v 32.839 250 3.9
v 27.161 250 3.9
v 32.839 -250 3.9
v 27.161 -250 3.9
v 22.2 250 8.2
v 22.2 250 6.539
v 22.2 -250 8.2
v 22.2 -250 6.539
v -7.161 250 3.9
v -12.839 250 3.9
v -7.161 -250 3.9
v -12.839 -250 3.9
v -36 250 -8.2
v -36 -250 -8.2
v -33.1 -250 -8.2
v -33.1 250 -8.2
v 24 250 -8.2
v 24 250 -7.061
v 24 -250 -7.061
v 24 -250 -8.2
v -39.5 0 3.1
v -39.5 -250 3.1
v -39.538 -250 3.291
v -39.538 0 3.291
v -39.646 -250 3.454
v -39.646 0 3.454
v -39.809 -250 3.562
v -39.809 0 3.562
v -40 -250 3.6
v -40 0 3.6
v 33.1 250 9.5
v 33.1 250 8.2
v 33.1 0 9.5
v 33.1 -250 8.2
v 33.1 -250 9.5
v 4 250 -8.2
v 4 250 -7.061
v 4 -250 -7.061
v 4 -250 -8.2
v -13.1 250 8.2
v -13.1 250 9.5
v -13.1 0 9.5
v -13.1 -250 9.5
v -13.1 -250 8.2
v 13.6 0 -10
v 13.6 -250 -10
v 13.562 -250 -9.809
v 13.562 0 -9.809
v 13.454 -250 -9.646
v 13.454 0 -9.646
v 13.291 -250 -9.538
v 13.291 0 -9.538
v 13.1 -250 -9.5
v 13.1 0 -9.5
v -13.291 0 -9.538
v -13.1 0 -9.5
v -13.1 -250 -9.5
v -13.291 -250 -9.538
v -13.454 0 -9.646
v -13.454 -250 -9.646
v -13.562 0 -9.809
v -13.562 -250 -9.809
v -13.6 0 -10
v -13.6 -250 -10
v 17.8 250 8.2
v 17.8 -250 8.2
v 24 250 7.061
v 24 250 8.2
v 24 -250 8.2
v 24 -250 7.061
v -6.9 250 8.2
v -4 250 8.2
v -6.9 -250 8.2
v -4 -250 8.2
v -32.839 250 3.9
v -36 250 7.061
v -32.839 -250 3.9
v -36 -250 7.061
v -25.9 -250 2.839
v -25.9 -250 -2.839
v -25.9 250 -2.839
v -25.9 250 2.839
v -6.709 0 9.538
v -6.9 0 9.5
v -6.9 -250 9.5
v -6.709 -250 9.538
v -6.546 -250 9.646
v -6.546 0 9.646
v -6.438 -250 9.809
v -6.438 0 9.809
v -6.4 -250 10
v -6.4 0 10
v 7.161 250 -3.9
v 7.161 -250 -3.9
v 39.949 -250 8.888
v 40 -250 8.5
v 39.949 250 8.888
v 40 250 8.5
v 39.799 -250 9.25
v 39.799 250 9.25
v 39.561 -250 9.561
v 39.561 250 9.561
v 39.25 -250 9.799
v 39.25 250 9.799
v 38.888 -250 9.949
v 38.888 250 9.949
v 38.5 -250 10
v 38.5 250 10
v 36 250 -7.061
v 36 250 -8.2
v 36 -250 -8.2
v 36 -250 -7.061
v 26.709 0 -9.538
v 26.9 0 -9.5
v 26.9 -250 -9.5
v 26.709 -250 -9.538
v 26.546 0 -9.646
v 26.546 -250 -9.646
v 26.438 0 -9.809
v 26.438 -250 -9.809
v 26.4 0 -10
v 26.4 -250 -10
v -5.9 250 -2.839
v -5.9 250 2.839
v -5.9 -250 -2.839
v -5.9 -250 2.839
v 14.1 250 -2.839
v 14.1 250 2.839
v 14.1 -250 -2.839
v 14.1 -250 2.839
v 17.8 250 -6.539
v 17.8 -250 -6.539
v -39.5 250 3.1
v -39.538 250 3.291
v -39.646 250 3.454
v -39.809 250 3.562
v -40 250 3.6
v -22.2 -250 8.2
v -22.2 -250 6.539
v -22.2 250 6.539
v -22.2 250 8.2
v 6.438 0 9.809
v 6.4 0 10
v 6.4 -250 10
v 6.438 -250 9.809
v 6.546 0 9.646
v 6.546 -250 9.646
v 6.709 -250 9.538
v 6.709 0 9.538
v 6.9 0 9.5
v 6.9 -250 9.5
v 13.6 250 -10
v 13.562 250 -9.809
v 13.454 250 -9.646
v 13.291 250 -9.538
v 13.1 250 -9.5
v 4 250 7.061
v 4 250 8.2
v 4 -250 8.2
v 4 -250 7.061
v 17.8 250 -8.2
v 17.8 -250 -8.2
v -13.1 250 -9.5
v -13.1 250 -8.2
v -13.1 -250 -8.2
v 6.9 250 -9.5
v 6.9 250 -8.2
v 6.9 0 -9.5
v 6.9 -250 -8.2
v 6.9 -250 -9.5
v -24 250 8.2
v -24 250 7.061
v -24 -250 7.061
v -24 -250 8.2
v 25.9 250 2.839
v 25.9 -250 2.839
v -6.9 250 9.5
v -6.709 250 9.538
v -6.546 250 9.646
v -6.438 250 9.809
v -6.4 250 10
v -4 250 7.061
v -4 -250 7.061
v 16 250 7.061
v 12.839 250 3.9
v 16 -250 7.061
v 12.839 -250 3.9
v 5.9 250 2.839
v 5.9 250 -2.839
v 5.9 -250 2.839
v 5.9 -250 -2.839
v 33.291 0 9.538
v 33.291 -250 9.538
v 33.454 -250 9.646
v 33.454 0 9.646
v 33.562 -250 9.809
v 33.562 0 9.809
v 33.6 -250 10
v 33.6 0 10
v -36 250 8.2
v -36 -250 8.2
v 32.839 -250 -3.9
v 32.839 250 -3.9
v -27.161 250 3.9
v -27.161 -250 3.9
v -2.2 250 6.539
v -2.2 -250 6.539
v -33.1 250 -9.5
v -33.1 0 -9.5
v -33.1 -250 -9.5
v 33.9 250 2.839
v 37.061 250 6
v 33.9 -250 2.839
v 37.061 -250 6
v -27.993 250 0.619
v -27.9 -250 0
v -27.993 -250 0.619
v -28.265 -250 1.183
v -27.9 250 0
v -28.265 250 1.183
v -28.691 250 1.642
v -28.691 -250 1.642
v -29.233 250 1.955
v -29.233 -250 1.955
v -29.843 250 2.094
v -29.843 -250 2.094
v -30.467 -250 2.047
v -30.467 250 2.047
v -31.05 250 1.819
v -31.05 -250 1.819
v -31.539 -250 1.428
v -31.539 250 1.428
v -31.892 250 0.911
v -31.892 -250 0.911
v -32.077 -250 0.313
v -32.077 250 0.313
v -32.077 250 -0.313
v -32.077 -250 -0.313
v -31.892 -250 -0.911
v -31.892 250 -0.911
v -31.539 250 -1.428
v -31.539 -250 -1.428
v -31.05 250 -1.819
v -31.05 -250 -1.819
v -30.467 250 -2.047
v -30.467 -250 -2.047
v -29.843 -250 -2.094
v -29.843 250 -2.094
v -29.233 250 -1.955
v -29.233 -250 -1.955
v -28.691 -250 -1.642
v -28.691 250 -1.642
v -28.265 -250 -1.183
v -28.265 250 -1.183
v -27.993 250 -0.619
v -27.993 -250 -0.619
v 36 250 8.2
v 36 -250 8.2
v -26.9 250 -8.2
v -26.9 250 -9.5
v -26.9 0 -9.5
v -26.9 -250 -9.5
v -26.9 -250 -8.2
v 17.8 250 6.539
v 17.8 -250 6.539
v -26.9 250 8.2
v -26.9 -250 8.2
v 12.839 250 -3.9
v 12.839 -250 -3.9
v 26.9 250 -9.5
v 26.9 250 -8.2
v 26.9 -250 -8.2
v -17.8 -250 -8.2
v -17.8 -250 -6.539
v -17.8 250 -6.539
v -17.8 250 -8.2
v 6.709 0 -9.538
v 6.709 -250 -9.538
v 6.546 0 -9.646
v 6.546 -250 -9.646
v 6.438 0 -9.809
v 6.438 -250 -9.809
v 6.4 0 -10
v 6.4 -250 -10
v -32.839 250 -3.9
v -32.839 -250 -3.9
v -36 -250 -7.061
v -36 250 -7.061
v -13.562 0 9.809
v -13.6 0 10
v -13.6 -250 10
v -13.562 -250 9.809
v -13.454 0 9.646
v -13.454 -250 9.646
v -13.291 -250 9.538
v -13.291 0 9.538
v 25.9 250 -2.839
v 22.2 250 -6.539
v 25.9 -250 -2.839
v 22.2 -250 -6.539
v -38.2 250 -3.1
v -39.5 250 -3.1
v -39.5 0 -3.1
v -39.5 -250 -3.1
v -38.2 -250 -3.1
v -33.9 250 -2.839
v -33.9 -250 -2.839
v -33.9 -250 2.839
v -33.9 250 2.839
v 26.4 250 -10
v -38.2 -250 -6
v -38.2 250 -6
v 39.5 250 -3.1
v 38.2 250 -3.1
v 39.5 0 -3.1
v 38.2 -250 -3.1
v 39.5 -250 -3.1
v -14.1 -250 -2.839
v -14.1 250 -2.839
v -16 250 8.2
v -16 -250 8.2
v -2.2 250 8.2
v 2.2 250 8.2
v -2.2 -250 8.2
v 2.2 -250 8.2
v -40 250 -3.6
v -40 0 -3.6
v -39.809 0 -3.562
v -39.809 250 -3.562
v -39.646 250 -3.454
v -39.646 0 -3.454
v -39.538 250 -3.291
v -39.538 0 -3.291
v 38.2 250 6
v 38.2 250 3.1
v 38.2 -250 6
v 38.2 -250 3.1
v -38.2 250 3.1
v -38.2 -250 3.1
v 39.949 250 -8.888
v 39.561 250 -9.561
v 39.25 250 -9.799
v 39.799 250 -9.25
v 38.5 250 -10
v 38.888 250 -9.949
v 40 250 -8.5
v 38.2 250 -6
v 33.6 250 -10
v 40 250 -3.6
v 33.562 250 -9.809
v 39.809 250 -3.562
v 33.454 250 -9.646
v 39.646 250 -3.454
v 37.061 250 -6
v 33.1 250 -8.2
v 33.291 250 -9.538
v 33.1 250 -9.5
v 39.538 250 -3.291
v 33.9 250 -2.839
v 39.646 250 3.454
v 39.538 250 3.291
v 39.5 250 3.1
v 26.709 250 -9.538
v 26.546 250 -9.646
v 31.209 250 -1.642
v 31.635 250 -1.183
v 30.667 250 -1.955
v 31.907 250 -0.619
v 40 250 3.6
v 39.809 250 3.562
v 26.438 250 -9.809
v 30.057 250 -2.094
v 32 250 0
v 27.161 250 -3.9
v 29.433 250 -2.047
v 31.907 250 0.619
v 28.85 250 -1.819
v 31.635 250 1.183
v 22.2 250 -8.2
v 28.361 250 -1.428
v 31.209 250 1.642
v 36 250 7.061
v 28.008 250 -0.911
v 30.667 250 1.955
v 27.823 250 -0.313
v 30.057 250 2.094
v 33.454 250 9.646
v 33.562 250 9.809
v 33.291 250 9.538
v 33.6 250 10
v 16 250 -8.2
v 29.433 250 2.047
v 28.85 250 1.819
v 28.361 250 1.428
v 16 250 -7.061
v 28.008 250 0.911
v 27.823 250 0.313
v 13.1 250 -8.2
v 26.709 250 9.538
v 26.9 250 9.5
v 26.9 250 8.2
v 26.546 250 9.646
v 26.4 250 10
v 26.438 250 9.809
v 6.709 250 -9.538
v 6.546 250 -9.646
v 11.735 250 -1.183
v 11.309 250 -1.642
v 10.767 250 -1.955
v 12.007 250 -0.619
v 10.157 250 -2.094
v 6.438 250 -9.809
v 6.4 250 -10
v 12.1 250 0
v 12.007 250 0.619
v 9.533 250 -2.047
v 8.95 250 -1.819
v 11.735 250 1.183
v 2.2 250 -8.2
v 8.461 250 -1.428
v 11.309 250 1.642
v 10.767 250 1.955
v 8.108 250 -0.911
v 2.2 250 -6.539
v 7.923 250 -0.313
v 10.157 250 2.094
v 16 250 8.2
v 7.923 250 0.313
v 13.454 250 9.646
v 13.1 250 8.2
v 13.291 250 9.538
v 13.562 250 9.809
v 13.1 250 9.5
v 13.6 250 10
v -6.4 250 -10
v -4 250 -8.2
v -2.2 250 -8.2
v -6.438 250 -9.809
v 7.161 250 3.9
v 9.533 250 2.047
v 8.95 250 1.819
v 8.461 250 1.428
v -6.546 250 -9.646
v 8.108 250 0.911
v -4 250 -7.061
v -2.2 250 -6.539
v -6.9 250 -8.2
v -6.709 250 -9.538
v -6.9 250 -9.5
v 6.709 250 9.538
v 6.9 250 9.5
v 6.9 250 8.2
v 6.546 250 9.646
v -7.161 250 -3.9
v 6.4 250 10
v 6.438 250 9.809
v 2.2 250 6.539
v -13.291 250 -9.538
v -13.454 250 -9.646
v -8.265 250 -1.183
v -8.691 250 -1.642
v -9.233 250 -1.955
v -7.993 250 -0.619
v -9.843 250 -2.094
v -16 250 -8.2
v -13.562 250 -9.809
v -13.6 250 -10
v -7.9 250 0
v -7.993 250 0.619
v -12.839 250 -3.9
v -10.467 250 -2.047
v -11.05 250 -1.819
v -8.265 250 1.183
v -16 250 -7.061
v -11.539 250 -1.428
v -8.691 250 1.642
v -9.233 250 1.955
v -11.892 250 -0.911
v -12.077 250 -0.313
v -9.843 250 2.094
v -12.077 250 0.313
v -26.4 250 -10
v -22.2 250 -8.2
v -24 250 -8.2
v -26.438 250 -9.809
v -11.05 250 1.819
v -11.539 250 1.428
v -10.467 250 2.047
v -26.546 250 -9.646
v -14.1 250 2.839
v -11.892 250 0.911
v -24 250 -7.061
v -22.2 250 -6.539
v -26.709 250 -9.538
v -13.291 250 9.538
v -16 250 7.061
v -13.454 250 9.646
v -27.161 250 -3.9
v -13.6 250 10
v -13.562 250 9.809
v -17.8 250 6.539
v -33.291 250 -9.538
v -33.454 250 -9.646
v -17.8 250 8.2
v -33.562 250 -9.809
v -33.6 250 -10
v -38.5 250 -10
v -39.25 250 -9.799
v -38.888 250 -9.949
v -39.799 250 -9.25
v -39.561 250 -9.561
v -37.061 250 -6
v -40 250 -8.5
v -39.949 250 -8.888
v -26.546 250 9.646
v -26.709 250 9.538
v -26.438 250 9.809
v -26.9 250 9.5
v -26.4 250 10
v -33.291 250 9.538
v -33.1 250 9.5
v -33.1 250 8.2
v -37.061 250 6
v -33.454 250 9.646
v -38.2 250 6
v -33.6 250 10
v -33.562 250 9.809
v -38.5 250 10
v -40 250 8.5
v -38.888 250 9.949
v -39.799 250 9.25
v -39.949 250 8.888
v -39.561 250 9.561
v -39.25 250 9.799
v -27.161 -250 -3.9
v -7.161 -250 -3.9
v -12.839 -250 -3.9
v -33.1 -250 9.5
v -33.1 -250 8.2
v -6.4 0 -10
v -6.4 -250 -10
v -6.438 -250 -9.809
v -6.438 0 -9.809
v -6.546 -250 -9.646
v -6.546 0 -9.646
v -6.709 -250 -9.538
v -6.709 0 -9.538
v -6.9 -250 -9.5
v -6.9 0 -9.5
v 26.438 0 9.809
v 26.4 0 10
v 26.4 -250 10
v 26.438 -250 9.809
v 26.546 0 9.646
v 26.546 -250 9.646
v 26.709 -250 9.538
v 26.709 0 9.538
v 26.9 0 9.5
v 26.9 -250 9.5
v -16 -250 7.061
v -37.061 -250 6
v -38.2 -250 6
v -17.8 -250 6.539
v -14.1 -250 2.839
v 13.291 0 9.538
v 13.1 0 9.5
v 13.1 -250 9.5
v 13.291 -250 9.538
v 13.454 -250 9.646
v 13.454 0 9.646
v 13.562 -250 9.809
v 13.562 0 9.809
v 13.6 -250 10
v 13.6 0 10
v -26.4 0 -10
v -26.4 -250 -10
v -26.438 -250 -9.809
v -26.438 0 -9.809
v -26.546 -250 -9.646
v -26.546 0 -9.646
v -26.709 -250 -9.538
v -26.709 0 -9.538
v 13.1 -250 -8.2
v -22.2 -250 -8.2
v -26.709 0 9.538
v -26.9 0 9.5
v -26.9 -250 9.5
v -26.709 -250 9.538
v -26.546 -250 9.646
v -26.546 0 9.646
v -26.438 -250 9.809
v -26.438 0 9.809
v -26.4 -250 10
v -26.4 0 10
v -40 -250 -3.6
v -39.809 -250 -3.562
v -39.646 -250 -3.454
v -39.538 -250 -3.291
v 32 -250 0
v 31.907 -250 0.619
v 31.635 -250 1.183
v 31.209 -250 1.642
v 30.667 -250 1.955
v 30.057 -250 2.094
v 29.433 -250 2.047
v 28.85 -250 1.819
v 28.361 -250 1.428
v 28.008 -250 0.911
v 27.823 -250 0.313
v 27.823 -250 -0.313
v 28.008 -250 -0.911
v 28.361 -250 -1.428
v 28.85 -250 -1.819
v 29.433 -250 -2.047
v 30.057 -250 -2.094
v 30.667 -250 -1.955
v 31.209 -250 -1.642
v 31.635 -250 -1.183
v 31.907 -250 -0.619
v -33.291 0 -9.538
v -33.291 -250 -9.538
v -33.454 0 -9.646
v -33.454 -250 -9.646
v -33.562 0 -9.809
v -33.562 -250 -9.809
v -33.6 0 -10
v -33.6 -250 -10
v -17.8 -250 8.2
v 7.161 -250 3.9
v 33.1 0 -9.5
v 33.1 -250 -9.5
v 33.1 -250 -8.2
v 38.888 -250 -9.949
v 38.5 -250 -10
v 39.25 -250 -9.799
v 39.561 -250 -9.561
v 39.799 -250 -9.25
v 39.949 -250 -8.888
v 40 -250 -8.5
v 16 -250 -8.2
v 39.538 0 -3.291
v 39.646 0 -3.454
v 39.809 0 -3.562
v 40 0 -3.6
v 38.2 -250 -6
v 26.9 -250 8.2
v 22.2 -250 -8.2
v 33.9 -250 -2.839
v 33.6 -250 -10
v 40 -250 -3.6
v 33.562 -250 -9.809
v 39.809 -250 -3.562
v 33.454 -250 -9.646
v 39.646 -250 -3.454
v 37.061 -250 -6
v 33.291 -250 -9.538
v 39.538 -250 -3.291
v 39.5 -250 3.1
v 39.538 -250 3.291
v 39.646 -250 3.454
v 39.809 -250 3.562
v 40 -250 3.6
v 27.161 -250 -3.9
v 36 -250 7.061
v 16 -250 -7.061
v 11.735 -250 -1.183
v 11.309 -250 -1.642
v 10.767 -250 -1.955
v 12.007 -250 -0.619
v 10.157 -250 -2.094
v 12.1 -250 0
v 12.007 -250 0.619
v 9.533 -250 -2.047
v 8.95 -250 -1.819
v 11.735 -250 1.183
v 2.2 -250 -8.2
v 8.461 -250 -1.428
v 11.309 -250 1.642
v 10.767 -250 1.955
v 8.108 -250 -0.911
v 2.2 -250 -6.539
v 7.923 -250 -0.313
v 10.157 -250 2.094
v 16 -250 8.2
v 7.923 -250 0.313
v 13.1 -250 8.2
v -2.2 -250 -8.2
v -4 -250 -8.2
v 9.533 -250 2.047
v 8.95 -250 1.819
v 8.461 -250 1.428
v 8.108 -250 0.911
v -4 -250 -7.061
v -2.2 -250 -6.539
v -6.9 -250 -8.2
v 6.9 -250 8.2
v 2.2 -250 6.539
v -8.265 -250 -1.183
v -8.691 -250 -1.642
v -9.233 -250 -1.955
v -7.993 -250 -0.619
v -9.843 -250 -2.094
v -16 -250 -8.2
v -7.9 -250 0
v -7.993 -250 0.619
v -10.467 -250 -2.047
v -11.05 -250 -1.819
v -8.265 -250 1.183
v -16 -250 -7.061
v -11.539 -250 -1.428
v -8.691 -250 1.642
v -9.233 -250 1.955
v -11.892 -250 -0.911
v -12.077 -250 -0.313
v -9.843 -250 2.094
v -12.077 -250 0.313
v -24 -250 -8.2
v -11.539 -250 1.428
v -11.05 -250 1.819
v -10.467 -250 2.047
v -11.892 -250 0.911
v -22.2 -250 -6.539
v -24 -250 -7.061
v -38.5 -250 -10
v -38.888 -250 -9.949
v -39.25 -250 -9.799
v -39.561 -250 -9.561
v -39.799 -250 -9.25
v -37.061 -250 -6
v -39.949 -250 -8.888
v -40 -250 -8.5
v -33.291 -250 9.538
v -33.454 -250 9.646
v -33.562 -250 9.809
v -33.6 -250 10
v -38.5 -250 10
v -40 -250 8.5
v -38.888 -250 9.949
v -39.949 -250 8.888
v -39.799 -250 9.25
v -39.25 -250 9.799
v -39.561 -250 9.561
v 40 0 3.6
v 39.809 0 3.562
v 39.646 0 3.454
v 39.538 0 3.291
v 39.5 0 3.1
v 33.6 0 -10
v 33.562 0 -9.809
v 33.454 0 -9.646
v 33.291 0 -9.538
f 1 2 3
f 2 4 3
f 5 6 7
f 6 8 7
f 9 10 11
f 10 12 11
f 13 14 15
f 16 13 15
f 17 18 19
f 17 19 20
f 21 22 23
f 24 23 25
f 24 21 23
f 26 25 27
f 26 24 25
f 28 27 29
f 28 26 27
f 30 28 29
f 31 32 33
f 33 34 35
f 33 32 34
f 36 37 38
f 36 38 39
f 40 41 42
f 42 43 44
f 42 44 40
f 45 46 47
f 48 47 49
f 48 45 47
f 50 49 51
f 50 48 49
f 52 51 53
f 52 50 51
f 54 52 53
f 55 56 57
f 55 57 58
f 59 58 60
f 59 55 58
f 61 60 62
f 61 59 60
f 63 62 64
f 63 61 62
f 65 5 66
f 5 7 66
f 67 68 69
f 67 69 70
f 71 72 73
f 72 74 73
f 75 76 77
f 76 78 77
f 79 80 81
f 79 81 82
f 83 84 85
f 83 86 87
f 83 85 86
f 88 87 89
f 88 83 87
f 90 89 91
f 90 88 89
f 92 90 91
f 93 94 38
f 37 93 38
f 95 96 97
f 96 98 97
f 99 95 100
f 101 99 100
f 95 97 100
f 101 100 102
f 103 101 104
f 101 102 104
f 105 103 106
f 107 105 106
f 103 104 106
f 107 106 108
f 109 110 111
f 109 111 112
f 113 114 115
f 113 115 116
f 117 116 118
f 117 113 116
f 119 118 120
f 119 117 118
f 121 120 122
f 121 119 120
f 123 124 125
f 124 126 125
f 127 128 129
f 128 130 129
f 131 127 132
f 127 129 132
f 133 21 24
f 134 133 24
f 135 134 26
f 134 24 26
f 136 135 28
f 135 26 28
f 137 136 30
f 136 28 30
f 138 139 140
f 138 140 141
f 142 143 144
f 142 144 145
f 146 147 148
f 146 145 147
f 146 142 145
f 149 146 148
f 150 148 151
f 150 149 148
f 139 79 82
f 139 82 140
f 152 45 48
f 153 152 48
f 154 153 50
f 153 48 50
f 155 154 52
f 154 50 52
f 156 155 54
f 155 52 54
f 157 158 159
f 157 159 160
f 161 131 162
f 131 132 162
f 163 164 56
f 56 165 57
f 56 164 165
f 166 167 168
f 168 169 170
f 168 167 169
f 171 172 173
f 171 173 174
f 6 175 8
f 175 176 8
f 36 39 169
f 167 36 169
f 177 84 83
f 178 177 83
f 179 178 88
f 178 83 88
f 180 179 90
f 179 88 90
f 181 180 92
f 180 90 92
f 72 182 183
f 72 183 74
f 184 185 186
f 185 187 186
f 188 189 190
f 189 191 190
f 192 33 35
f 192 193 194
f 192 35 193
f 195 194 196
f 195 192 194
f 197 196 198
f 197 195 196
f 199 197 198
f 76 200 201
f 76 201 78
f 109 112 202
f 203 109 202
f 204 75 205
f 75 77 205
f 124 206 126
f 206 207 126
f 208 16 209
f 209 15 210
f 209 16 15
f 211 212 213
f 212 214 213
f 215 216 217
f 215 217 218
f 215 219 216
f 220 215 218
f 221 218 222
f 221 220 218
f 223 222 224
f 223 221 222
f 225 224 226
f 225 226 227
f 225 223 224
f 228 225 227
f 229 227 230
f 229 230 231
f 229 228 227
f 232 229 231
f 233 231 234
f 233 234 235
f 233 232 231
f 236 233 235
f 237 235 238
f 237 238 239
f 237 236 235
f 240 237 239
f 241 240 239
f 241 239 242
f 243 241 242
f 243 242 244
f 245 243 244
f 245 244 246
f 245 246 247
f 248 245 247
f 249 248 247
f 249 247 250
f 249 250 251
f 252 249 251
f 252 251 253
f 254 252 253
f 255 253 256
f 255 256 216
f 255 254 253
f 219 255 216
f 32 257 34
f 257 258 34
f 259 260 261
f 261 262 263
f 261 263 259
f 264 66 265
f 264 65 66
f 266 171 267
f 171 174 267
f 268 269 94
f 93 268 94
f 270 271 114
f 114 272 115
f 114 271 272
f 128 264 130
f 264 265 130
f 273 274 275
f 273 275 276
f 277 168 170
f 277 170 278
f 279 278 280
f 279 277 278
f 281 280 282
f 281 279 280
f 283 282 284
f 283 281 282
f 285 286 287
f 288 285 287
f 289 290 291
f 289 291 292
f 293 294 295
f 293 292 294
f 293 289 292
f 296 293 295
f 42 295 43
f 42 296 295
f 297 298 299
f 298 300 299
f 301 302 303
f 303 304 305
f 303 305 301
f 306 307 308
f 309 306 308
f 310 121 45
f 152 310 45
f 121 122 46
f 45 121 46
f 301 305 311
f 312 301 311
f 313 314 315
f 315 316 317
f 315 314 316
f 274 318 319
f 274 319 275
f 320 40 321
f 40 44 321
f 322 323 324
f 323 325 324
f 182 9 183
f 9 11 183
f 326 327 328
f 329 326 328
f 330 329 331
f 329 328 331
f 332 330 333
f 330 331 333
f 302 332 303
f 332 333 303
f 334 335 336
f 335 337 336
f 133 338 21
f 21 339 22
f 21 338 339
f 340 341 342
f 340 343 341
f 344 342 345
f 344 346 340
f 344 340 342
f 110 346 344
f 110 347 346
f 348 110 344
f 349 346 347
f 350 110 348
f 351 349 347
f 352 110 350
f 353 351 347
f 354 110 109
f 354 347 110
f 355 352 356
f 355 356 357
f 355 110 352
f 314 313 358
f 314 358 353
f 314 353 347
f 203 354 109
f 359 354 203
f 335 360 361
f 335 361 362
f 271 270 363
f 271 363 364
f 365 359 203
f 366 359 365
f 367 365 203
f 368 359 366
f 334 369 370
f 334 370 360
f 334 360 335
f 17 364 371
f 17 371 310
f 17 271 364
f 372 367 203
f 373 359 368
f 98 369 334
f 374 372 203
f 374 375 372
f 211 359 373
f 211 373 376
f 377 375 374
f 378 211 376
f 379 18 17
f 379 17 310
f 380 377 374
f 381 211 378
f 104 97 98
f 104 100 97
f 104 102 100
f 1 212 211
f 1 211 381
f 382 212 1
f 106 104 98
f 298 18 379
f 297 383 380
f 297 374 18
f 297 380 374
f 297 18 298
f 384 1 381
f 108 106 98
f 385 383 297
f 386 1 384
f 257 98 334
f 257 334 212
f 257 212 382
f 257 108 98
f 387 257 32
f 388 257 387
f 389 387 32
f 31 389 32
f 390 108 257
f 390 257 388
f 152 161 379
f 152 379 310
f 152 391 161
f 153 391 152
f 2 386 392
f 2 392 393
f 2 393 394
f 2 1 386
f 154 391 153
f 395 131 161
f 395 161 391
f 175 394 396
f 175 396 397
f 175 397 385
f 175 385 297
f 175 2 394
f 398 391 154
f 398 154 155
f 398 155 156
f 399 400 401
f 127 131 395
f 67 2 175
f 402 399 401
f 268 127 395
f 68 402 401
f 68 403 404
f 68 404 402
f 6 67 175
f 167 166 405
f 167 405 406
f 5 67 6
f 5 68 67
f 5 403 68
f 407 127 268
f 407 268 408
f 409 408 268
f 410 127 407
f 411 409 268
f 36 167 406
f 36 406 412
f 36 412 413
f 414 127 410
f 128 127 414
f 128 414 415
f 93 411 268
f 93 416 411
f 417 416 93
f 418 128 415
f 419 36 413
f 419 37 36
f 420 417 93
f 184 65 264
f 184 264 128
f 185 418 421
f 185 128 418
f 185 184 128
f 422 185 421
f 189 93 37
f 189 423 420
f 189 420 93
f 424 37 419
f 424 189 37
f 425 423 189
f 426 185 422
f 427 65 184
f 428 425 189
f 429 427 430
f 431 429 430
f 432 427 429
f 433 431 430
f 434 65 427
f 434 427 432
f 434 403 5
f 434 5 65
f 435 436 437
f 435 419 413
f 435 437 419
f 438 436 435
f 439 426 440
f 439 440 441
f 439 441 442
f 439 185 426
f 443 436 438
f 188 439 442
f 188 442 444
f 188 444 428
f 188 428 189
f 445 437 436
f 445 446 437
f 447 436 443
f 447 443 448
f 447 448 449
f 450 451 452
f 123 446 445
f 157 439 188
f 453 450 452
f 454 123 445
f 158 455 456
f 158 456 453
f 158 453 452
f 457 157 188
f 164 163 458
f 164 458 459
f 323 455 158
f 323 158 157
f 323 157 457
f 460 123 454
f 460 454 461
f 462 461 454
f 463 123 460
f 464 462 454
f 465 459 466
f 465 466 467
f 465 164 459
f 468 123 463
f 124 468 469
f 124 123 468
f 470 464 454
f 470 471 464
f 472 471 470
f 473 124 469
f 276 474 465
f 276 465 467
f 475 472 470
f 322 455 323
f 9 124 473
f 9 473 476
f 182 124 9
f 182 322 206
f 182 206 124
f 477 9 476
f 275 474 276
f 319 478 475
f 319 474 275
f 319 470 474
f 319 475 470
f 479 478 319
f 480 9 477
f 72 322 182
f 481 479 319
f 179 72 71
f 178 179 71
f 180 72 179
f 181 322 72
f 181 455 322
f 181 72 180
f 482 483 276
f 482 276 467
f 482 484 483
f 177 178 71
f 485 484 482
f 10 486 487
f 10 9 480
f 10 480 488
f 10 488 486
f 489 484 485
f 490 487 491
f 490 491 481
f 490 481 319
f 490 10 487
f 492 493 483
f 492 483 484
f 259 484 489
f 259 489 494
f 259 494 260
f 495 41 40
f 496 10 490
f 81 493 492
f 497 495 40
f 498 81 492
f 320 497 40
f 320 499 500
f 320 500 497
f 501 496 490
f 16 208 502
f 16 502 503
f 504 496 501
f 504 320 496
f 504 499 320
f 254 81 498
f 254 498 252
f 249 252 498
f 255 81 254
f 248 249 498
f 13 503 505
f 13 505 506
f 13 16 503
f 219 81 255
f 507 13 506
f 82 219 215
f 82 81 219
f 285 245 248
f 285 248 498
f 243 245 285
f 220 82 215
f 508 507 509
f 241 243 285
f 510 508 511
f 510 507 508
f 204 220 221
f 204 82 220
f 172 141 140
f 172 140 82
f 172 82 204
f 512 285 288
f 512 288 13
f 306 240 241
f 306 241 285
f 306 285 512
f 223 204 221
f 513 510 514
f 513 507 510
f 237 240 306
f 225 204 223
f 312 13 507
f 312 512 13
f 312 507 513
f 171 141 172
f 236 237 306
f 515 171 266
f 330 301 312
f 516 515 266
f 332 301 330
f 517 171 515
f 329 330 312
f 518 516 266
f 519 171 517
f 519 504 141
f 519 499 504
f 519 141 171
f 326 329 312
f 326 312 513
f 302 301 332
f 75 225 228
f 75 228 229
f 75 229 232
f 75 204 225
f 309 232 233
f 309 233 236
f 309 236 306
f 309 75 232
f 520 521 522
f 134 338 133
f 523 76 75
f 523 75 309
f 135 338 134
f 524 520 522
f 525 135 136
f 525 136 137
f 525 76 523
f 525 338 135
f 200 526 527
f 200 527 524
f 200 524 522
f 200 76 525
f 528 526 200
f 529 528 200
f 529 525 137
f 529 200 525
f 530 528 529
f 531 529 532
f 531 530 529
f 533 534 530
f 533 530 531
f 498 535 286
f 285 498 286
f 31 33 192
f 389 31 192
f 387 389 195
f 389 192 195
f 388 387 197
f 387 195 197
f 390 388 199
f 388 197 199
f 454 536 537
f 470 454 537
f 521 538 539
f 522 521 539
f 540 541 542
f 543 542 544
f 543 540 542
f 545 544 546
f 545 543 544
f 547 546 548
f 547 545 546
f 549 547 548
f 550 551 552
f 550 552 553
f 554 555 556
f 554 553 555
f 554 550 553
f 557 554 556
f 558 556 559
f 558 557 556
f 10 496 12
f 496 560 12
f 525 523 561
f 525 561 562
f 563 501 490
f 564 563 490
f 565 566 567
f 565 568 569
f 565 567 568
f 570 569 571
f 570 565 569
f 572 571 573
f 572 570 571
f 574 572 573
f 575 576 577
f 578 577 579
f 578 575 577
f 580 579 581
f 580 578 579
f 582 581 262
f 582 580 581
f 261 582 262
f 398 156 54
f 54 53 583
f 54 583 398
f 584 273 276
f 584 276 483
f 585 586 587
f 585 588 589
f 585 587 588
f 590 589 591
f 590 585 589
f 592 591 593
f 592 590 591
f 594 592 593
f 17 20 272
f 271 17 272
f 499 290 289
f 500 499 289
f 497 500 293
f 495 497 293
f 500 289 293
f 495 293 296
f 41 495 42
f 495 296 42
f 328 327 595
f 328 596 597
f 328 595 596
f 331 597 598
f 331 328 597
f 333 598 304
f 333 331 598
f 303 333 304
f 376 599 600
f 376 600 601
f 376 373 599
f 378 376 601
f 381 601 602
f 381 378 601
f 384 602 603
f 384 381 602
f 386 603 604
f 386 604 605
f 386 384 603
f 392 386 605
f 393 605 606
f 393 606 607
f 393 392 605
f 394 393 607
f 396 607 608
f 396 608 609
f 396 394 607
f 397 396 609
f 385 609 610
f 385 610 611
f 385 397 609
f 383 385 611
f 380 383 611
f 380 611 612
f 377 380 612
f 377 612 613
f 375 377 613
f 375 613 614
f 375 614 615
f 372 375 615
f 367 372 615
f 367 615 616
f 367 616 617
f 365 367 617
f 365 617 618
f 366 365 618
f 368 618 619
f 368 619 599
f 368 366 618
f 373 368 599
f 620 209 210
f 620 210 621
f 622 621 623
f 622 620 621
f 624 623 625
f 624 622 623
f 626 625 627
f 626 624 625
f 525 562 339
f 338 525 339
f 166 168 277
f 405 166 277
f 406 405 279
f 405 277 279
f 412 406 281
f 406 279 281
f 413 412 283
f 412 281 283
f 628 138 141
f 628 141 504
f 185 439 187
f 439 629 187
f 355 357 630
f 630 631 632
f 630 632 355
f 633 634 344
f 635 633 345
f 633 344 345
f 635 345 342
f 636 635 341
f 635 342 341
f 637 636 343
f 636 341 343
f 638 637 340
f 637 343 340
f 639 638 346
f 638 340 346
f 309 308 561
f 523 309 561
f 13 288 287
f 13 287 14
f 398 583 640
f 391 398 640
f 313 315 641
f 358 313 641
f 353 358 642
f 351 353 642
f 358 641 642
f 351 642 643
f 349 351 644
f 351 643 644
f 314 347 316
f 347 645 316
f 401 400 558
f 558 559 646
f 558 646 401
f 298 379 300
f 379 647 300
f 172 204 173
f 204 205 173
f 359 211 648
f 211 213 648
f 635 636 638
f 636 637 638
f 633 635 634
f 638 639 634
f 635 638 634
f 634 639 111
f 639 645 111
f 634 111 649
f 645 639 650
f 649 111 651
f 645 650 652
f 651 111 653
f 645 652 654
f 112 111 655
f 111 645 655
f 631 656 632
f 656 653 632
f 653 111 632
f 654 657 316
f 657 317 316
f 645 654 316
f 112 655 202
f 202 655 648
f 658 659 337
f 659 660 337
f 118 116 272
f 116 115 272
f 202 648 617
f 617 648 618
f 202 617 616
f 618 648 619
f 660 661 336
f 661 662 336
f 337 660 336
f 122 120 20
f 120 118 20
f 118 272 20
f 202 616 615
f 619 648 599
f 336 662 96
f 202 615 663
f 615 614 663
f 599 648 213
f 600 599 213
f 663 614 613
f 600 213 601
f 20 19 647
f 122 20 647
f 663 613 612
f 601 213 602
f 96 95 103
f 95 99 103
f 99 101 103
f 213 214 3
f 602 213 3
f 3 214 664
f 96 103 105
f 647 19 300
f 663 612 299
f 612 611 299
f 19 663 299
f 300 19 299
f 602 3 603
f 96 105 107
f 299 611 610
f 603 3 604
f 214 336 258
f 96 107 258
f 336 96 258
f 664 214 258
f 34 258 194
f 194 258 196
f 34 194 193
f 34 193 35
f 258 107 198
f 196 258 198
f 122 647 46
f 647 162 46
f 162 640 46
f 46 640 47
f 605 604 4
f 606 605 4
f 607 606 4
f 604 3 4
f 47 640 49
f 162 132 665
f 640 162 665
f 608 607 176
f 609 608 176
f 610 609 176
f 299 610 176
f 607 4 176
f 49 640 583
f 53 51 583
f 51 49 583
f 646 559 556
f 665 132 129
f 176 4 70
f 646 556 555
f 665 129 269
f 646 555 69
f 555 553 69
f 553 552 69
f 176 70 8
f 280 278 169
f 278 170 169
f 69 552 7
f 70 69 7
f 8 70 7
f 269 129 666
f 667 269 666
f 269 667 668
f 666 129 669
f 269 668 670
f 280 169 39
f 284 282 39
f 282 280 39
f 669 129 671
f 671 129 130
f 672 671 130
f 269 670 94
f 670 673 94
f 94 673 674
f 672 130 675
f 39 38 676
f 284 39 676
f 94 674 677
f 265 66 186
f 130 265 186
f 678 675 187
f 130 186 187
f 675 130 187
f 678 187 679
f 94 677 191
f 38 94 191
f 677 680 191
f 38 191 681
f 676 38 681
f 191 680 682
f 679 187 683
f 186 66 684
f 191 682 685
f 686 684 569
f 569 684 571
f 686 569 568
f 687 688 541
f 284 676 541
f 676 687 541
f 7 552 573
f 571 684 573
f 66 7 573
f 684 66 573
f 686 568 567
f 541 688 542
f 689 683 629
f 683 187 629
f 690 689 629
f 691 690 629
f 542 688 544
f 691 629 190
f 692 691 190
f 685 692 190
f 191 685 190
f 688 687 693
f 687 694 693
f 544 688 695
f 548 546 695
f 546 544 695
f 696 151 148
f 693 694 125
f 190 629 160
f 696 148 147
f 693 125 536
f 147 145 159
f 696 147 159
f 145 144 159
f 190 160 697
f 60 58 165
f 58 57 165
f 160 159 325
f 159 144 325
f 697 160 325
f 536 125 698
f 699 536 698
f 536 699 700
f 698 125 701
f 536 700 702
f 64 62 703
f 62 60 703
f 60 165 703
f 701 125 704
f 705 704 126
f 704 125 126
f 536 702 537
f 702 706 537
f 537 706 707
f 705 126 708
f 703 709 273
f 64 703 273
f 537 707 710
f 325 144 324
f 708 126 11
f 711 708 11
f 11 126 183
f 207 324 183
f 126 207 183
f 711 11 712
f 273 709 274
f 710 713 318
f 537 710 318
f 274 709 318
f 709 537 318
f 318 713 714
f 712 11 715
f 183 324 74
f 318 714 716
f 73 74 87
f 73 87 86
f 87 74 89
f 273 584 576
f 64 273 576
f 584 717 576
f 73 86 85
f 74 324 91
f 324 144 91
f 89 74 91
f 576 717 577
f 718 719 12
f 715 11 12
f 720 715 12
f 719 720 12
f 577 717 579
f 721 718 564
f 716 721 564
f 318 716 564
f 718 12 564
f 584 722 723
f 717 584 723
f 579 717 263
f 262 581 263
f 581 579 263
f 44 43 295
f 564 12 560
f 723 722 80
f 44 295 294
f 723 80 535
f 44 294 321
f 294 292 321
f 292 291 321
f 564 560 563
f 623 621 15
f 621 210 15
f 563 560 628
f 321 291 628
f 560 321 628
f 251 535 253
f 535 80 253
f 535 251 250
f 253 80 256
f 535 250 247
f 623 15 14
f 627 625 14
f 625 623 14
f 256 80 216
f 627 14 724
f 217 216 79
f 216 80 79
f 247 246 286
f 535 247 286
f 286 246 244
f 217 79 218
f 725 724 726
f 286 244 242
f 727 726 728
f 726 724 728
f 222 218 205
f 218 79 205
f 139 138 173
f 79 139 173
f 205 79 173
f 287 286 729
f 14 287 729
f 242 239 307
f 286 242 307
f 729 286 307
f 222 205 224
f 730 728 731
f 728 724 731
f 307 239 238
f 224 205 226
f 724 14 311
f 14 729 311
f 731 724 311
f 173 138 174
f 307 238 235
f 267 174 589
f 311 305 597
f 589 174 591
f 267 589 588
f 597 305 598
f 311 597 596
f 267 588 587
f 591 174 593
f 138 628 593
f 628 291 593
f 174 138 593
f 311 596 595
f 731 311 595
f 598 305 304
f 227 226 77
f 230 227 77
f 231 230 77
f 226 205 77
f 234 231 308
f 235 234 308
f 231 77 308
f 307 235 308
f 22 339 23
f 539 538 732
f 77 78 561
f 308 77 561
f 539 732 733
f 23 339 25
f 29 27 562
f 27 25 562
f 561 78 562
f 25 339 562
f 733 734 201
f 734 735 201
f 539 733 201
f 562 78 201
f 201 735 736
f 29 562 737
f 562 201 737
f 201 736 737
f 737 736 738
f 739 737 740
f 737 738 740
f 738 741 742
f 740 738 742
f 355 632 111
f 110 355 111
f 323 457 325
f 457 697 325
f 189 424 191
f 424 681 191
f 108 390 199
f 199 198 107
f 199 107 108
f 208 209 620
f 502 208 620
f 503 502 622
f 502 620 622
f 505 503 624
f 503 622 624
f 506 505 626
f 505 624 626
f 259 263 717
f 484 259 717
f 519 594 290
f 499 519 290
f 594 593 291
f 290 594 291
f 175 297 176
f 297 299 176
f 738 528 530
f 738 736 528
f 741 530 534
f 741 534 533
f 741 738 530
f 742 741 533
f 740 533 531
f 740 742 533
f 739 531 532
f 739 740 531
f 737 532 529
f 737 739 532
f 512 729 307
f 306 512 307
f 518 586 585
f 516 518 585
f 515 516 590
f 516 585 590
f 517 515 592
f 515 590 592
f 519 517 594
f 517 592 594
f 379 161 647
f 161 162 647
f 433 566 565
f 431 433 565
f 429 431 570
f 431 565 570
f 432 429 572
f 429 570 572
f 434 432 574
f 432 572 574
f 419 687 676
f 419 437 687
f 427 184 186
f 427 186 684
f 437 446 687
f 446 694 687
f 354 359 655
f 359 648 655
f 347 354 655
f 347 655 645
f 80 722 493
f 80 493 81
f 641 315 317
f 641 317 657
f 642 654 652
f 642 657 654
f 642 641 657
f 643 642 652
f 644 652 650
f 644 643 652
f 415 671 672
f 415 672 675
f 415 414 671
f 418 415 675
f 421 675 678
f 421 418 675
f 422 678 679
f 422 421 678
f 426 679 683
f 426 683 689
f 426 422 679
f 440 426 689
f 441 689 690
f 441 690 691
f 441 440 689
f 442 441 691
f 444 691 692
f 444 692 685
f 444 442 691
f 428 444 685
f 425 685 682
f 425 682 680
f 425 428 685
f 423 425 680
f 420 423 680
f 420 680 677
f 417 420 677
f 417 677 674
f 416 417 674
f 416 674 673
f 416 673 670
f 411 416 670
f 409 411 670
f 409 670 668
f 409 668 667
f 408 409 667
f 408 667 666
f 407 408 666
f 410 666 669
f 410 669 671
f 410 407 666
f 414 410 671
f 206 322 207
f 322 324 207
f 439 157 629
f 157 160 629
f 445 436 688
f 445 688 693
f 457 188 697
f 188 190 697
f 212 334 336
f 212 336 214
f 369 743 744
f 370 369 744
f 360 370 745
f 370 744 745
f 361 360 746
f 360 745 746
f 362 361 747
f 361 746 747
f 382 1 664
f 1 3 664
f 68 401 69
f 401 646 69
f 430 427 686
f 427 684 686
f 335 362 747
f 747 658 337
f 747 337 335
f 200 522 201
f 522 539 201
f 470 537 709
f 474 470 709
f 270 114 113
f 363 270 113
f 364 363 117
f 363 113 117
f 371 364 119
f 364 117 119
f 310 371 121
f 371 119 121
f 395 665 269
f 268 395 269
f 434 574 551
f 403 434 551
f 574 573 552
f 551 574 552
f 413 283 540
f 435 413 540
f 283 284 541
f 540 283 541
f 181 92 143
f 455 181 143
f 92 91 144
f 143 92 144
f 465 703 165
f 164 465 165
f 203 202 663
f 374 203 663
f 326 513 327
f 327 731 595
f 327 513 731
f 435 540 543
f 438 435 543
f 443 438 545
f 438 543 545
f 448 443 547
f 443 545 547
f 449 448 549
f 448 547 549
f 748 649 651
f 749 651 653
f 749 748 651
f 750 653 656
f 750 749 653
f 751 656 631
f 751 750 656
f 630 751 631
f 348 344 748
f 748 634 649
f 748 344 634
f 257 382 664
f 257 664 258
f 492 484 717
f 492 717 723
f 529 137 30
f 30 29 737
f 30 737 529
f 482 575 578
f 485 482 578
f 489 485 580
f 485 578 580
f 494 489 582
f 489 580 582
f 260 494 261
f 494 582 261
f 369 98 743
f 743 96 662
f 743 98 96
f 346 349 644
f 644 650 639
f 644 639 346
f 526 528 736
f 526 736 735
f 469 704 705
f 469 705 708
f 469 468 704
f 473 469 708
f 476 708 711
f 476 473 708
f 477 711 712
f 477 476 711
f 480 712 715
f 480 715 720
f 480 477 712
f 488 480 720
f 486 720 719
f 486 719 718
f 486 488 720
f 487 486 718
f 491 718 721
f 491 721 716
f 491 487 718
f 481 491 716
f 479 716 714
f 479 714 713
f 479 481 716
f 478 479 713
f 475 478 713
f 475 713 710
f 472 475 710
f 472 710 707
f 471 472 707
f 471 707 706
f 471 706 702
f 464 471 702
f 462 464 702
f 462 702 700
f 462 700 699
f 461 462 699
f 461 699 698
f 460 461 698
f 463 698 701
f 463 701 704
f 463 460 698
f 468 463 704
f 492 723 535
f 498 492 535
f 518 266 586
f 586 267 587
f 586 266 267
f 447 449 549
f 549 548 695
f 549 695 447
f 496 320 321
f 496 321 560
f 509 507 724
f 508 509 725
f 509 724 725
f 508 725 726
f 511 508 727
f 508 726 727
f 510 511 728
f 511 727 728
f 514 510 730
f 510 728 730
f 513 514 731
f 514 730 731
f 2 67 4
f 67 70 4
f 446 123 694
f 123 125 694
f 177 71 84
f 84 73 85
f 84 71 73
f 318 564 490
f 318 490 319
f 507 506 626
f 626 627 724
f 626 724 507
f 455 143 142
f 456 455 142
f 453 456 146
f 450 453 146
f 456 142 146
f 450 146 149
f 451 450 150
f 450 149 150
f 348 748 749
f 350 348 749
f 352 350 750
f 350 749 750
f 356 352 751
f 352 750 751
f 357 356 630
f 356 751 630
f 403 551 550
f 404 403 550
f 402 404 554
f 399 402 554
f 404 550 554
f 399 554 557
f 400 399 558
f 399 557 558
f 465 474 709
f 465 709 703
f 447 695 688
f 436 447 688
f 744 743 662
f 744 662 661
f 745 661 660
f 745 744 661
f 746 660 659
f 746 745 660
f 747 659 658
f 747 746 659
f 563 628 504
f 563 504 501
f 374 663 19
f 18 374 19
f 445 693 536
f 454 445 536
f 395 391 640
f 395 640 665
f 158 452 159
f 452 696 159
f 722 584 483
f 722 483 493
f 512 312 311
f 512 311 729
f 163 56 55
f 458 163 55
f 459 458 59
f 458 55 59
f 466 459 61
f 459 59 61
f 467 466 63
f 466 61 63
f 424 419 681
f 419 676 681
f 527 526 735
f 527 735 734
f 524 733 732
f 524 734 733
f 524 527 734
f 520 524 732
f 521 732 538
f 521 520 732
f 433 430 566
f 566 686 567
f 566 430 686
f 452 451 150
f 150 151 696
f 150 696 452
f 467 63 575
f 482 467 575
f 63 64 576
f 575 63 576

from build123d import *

# Parameters (mm, degrees)
SKETCH_R          = 2.1
PAD_DEPTH         = 250
FILLET_R          = 1.5
SKETCH001_R       = 0.5
POCKET_DEPTH      = 250.001
POCKET_DEPTH_BACK = -250.001


with BuildPart() as part:
    # Sketch → Pad (new body, symmetric)
    with BuildSketch(Plane.XZ):
        Polygon((-10, 10), (-3.1, 10), (-3.1, 8.2), (-6, 8.2), (-6, 7.06066), (-2.83934, 3.9), (2.83934, 3.9), (6, 7.06066), (6, 8.2), (3.1, 8.2), (3.1, 10), (16.9, 10), (16.9, 8.2), (14, 8.2), (14, 7.06066), (17.16066, 3.9), (22.83934, 3.9), (26, 7.06066), (26, 8.2), (23.1, 8.2), (23.1, 10), (36.9, 10), (36.9, 8.2), (34, 8.2), (34, 7.06066), (37.16066, 3.9), (42.83934, 3.9), (46, 7.06066), (46, 8.2), (43.1, 8.2), (43.1, 10), (56.9, 10), (56.9, 8.2), (54, 8.2), (54, 7.06066), (57.16066, 3.9), (62.83934, 3.9), (66, 7.06066), (66, 8.2), (63.1, 8.2), (63.1, 10), (70, 10), (70, 3.1), (68.2, 3.1), (68.2, 6), (67.06066, 6), (63.9, 2.83934), (63.9, -2.83934), (67.06066, -6), (68.2, -6), (68.2, -3.1), (70, -3.1), (70, -10), (63.1, -10), (63.1, -8.2), (66, -8.2), (66, -7.06066), (62.83934, -3.9), (57.16066, -3.9), (54, -7.06066), (54, -8.2), (56.9, -8.2), (56.9, -10), (43.1, -10), (43.1, -8.2), (46, -8.2), (46, -7.06066), (42.83934, -3.9), (37.16066, -3.9), (34, -7.06066), (34, -8.2), (36.9, -8.2), (36.9, -10), (23.1, -10), (23.1, -8.2), (26, -8.2), (26, -7.06066), (22.83934, -3.9), (17.16066, -3.9), (14, -7.06066), (14, -8.2), (16.9, -8.2), (16.9, -10), (3.1, -10), (3.1, -8.2), (6, -8.2), (6, -7.06066), (2.83934, -3.9), (-2.83934, -3.9), (-6, -7.06066), (-6, -8.2), (-3.1, -8.2), (-3.1, -10), (-10, -10), (-10, -3.1), (-8.2, -3.1), (-8.2, -6), (-7.06066, -6), (-3.9, -2.83934), (-3.9, 2.83934), (-7.06066, 6), (-8.2, 6), (-8.2, 3.1), (-10, 3.1), align=None)
        Circle(SKETCH_R, mode=Mode.SUBTRACT)
        with Locations((20, 0)):
            Circle(SKETCH_R, mode=Mode.SUBTRACT)
        with Locations((40, 0)):
            Circle(SKETCH_R, mode=Mode.SUBTRACT)
        with Locations((59.9, 0)):
            Circle(SKETCH_R, mode=Mode.SUBTRACT)
        Polygon((7.8, -6.53934), (4.1, -2.83934), (4.1, 2.83934), (7.8, 6.53934), (7.8, 8.2), (12.2, 8.2), (12.2, 6.53934), (15.9, 2.83934), (15.9, -2.83934), (12.2, -6.53934), (12.2, -8.2), (7.8, -8.2), align=None, mode=Mode.SUBTRACT)
        Polygon((27.8, 8.2), (27.8, 6.53934), (24.1, 2.83934), (24.1, -2.83934), (27.8, -6.53934), (27.8, -8.2), (32.2, -8.2), (32.2, -6.53934), (35.9, -2.83934), (35.9, 2.83934), (32.2, 6.53934), (32.2, 8.2), align=None, mode=Mode.SUBTRACT)
        Polygon((47.8, 8.2), (47.8, 6.53934), (44.1, 2.83934), (44.1, -2.83934), (47.8, -6.53934), (47.8, -8.2), (52.2, -8.2), (52.2, -6.53934), (55.9, -2.83934), (55.9, 2.83934), (52.2, 6.53934), (52.2, 8.2), align=None, mode=Mode.SUBTRACT)
    extrude(amount=PAD_DEPTH, both=True)

    # Fillet
    fillet_edges = [part.edges().sort_by_distance(p)[0] for p in [
        (-10, 0, 10),
        (-10, 0, -10),
        (70, 0, -10),
        (70, 0, 10),
    ]]
    fillet(fillet_edges, radius=FILLET_R)

    # Sketch001 → Pocket (cut, two sides)
    with BuildSketch(Plane.XZ) as pocket_sk:
        with Locations((63.1, 10)):
            Circle(SKETCH001_R)
        with Locations((56.9, 10)):
            Circle(SKETCH001_R)
        with Locations((70, 3.1)):
            Circle(SKETCH001_R)
        with Locations((70, -3.1)):
            Circle(SKETCH001_R)
        with Locations((63.1, -10)):
            Circle(SKETCH001_R)
        with Locations((56.9, -10)):
            Circle(SKETCH001_R)
        with Locations((43.1, -10)):
            Circle(SKETCH001_R)
        with Locations((36.9, -10)):
            Circle(SKETCH001_R)
        with Locations((23.1, -10)):
            Circle(SKETCH001_R)
        with Locations((16.9, -10)):
            Circle(SKETCH001_R)
        with Locations((43.1, 10)):
            Circle(SKETCH001_R)
        with Locations((36.9, 10)):
            Circle(SKETCH001_R)
        with Locations((23.1, 10)):
            Circle(SKETCH001_R)
        with Locations((16.9, 10)):
            Circle(SKETCH001_R)
        with Locations((3.1, 10)):
            Circle(SKETCH001_R)
        with Locations((-3.1, 10)):
            Circle(SKETCH001_R)
        with Locations((-10, 3.1)):
            Circle(SKETCH001_R)
        with Locations((-10, -3.1)):
            Circle(SKETCH001_R)
        with Locations((-3.1, -10)):
            Circle(SKETCH001_R)
        with Locations((3.1, -10)):
            Circle(SKETCH001_R)
    extrude(amount=-POCKET_DEPTH, mode=Mode.SUBTRACT)
    extrude(pocket_sk.sketch, amount=-POCKET_DEPTH_BACK, mode=Mode.SUBTRACT)


with BuildPart() as part_1:
    # Body placement: moved
    add(part.part.moved(Location((-30, 0, 0))))


solid = part_1.part
